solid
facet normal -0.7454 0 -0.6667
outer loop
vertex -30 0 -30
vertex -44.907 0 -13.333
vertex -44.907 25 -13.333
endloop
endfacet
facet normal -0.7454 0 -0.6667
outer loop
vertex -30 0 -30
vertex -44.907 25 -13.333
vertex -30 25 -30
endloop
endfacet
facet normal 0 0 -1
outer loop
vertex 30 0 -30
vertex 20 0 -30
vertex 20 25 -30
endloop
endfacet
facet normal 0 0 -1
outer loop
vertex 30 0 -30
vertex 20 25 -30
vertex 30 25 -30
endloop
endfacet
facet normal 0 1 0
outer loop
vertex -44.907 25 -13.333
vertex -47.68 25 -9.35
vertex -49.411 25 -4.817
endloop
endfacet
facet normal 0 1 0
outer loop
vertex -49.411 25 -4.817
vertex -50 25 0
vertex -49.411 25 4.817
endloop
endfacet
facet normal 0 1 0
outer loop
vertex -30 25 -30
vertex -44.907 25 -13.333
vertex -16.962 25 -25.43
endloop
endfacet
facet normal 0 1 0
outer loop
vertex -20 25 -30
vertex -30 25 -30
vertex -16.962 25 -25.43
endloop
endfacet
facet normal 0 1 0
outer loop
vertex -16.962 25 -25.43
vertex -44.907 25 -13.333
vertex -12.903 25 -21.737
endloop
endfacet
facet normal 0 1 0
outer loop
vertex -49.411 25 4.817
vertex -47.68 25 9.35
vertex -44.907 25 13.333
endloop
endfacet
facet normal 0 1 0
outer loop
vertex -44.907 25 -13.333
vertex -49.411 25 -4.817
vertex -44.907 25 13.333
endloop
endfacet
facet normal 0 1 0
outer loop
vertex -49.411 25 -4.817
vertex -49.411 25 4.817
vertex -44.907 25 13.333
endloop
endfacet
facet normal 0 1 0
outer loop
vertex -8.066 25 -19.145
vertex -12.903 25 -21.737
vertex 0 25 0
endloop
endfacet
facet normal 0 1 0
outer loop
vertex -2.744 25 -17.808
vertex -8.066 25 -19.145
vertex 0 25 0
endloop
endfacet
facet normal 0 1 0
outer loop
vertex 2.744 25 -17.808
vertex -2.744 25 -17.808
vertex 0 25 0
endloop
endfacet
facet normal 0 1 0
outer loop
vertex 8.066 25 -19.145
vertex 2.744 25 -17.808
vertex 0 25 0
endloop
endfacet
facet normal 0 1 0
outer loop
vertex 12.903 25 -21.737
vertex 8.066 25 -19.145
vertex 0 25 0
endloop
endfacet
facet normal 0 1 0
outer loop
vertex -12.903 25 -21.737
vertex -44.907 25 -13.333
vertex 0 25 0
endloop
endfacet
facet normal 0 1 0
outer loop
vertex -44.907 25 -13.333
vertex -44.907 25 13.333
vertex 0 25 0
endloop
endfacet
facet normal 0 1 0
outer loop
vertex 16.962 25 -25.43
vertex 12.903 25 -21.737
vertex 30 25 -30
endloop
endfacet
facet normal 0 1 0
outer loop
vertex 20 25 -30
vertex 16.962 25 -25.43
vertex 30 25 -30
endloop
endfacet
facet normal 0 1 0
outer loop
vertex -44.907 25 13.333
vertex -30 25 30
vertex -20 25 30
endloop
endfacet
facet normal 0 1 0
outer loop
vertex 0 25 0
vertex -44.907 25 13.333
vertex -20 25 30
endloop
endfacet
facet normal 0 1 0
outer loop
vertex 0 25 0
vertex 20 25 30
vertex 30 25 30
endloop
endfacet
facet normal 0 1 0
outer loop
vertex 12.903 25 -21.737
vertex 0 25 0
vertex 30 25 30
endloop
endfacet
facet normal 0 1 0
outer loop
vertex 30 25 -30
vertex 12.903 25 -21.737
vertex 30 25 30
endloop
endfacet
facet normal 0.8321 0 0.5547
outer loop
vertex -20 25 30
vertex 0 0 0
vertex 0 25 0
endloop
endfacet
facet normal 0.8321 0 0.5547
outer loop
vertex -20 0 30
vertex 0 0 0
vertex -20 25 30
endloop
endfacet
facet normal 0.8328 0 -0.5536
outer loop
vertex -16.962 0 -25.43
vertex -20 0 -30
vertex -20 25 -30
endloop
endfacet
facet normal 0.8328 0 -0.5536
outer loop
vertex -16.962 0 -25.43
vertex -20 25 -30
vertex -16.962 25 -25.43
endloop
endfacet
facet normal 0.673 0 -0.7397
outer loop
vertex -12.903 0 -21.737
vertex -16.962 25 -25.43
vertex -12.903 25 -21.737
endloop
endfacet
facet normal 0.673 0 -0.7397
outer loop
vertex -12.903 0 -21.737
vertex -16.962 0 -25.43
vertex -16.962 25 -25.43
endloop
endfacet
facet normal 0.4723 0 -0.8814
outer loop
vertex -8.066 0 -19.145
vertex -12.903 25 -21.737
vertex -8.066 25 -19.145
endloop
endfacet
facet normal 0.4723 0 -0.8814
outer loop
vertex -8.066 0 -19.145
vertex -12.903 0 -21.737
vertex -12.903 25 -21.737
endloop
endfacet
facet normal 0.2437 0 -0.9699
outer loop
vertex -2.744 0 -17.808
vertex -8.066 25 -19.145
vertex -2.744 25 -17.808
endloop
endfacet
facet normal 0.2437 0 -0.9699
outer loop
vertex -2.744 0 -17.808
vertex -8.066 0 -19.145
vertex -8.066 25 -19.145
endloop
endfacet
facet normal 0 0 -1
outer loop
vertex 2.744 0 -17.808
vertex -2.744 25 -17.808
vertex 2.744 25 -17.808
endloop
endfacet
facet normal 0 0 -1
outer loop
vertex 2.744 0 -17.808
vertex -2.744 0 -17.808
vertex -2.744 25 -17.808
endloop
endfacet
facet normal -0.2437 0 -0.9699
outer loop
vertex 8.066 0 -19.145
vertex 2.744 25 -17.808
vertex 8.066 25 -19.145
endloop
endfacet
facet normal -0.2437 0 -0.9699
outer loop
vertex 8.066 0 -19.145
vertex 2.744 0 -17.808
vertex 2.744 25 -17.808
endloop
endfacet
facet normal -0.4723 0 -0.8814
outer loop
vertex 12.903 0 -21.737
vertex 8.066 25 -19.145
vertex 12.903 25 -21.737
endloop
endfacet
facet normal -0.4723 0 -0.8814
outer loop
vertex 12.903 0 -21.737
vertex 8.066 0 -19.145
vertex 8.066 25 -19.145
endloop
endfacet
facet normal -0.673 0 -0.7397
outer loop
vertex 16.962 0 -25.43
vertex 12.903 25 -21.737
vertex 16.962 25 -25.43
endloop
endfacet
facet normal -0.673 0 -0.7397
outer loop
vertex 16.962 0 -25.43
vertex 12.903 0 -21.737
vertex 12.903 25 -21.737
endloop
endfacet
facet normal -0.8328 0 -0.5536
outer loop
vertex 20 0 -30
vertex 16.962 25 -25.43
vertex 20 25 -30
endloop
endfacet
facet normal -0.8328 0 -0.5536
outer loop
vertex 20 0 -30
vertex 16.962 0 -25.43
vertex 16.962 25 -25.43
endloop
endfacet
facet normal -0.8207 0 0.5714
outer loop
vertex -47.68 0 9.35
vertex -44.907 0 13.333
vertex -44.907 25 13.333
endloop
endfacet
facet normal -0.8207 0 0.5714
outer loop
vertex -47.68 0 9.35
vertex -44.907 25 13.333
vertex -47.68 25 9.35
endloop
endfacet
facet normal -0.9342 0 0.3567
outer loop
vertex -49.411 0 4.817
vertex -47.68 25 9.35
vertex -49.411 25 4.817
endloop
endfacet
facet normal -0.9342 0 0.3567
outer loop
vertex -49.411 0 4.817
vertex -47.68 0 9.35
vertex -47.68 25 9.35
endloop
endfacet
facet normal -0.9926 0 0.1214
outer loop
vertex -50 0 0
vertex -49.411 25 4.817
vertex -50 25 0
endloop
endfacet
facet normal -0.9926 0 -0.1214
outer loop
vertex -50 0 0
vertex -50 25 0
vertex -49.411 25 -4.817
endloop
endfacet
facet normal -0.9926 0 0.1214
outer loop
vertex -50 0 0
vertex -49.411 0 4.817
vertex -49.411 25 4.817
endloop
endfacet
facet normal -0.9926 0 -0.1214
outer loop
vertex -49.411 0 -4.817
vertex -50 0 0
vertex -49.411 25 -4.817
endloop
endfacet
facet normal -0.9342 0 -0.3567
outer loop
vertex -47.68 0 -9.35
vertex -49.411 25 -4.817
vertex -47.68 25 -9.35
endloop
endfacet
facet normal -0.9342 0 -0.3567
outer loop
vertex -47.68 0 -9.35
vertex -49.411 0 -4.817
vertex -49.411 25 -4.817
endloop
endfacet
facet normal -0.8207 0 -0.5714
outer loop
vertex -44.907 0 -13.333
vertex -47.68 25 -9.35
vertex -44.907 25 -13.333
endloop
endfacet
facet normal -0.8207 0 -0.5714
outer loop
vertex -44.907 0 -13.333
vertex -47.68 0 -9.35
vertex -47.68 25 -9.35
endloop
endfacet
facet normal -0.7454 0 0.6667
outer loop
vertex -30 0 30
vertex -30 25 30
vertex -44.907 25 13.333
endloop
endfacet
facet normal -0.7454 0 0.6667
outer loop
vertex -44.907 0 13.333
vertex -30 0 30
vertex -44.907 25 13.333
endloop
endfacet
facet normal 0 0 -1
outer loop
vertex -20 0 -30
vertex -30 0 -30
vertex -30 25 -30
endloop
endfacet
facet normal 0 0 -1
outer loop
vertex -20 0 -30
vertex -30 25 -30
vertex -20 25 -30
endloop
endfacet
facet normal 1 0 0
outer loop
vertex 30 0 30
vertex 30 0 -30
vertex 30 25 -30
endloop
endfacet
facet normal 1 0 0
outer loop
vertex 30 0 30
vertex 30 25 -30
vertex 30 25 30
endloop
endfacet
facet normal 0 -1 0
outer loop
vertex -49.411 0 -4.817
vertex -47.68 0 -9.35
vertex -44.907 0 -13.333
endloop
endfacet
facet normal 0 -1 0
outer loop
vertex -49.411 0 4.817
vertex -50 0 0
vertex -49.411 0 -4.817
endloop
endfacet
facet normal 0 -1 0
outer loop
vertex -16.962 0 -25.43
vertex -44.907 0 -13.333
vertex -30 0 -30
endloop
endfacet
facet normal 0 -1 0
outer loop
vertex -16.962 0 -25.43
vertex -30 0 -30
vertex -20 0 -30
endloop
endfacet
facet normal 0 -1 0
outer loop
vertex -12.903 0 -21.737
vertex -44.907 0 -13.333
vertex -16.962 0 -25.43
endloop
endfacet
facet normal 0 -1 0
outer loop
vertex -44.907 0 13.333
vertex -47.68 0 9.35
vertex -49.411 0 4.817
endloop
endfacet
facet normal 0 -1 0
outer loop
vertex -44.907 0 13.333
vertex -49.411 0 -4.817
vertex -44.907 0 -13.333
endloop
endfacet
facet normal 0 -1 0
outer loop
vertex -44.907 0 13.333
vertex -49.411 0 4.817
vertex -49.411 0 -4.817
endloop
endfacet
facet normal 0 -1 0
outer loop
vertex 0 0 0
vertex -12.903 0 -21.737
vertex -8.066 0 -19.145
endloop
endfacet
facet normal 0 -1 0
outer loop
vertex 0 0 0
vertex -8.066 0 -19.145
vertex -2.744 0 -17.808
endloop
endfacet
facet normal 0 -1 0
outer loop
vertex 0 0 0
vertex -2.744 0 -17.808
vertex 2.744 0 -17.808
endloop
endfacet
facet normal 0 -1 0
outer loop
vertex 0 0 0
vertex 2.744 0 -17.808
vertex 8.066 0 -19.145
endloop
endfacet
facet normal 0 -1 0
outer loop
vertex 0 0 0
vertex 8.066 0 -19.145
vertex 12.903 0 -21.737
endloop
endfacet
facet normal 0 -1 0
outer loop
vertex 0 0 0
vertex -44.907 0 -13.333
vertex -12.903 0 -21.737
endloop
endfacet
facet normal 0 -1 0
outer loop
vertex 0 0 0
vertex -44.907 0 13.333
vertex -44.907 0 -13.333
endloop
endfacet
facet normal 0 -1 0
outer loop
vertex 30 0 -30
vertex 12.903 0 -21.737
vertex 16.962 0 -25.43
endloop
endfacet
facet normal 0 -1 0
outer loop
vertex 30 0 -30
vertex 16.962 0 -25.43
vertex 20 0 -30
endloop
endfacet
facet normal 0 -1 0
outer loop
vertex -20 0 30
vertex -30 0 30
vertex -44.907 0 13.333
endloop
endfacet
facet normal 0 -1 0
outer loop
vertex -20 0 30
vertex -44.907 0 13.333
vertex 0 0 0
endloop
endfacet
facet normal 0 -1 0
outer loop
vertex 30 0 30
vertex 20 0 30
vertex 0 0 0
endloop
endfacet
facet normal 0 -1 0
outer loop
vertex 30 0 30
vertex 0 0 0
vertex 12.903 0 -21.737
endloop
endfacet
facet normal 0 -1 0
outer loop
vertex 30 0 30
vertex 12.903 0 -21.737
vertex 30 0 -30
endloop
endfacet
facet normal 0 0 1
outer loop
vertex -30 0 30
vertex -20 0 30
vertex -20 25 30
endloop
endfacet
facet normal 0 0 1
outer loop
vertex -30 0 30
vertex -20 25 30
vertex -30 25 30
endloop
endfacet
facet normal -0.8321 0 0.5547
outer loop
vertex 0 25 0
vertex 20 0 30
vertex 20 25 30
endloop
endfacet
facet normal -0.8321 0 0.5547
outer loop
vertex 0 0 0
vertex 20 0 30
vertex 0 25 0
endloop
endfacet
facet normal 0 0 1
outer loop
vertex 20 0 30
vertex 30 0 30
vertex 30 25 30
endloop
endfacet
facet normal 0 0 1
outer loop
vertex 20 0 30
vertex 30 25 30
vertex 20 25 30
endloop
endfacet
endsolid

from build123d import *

# Parameters (mm, degrees)
F1_DEPTH = 25


with BuildPart() as f1:
    # F0 (on Front) → F1 (new body)
    with BuildSketch(Plane.XZ):
        with BuildLine():
            Line((20, 30), (0, 0))
            Line((0, 0), (-20, 30))
            Line((-20, 30), (-30, 30))
            Line((-30, 30), (-44.90712, 13.333333))
            ThreePointArc((-44.90712, 13.333333), (-50, 0), (-44.90712, -13.333333))
            Line((-44.90712, -13.333333), (-30, -30))
            Line((-30, -30), (-20, -30))
            ThreePointArc((-20, -30), (0, -17.63932), (20, -30))
            Line((20, -30), (30, -30))
            Line((30, -30), (30, 30))
            Line((30, 30), (20, 30))
        make_face()
    extrude(amount=-F1_DEPTH)


solid = f1.part
